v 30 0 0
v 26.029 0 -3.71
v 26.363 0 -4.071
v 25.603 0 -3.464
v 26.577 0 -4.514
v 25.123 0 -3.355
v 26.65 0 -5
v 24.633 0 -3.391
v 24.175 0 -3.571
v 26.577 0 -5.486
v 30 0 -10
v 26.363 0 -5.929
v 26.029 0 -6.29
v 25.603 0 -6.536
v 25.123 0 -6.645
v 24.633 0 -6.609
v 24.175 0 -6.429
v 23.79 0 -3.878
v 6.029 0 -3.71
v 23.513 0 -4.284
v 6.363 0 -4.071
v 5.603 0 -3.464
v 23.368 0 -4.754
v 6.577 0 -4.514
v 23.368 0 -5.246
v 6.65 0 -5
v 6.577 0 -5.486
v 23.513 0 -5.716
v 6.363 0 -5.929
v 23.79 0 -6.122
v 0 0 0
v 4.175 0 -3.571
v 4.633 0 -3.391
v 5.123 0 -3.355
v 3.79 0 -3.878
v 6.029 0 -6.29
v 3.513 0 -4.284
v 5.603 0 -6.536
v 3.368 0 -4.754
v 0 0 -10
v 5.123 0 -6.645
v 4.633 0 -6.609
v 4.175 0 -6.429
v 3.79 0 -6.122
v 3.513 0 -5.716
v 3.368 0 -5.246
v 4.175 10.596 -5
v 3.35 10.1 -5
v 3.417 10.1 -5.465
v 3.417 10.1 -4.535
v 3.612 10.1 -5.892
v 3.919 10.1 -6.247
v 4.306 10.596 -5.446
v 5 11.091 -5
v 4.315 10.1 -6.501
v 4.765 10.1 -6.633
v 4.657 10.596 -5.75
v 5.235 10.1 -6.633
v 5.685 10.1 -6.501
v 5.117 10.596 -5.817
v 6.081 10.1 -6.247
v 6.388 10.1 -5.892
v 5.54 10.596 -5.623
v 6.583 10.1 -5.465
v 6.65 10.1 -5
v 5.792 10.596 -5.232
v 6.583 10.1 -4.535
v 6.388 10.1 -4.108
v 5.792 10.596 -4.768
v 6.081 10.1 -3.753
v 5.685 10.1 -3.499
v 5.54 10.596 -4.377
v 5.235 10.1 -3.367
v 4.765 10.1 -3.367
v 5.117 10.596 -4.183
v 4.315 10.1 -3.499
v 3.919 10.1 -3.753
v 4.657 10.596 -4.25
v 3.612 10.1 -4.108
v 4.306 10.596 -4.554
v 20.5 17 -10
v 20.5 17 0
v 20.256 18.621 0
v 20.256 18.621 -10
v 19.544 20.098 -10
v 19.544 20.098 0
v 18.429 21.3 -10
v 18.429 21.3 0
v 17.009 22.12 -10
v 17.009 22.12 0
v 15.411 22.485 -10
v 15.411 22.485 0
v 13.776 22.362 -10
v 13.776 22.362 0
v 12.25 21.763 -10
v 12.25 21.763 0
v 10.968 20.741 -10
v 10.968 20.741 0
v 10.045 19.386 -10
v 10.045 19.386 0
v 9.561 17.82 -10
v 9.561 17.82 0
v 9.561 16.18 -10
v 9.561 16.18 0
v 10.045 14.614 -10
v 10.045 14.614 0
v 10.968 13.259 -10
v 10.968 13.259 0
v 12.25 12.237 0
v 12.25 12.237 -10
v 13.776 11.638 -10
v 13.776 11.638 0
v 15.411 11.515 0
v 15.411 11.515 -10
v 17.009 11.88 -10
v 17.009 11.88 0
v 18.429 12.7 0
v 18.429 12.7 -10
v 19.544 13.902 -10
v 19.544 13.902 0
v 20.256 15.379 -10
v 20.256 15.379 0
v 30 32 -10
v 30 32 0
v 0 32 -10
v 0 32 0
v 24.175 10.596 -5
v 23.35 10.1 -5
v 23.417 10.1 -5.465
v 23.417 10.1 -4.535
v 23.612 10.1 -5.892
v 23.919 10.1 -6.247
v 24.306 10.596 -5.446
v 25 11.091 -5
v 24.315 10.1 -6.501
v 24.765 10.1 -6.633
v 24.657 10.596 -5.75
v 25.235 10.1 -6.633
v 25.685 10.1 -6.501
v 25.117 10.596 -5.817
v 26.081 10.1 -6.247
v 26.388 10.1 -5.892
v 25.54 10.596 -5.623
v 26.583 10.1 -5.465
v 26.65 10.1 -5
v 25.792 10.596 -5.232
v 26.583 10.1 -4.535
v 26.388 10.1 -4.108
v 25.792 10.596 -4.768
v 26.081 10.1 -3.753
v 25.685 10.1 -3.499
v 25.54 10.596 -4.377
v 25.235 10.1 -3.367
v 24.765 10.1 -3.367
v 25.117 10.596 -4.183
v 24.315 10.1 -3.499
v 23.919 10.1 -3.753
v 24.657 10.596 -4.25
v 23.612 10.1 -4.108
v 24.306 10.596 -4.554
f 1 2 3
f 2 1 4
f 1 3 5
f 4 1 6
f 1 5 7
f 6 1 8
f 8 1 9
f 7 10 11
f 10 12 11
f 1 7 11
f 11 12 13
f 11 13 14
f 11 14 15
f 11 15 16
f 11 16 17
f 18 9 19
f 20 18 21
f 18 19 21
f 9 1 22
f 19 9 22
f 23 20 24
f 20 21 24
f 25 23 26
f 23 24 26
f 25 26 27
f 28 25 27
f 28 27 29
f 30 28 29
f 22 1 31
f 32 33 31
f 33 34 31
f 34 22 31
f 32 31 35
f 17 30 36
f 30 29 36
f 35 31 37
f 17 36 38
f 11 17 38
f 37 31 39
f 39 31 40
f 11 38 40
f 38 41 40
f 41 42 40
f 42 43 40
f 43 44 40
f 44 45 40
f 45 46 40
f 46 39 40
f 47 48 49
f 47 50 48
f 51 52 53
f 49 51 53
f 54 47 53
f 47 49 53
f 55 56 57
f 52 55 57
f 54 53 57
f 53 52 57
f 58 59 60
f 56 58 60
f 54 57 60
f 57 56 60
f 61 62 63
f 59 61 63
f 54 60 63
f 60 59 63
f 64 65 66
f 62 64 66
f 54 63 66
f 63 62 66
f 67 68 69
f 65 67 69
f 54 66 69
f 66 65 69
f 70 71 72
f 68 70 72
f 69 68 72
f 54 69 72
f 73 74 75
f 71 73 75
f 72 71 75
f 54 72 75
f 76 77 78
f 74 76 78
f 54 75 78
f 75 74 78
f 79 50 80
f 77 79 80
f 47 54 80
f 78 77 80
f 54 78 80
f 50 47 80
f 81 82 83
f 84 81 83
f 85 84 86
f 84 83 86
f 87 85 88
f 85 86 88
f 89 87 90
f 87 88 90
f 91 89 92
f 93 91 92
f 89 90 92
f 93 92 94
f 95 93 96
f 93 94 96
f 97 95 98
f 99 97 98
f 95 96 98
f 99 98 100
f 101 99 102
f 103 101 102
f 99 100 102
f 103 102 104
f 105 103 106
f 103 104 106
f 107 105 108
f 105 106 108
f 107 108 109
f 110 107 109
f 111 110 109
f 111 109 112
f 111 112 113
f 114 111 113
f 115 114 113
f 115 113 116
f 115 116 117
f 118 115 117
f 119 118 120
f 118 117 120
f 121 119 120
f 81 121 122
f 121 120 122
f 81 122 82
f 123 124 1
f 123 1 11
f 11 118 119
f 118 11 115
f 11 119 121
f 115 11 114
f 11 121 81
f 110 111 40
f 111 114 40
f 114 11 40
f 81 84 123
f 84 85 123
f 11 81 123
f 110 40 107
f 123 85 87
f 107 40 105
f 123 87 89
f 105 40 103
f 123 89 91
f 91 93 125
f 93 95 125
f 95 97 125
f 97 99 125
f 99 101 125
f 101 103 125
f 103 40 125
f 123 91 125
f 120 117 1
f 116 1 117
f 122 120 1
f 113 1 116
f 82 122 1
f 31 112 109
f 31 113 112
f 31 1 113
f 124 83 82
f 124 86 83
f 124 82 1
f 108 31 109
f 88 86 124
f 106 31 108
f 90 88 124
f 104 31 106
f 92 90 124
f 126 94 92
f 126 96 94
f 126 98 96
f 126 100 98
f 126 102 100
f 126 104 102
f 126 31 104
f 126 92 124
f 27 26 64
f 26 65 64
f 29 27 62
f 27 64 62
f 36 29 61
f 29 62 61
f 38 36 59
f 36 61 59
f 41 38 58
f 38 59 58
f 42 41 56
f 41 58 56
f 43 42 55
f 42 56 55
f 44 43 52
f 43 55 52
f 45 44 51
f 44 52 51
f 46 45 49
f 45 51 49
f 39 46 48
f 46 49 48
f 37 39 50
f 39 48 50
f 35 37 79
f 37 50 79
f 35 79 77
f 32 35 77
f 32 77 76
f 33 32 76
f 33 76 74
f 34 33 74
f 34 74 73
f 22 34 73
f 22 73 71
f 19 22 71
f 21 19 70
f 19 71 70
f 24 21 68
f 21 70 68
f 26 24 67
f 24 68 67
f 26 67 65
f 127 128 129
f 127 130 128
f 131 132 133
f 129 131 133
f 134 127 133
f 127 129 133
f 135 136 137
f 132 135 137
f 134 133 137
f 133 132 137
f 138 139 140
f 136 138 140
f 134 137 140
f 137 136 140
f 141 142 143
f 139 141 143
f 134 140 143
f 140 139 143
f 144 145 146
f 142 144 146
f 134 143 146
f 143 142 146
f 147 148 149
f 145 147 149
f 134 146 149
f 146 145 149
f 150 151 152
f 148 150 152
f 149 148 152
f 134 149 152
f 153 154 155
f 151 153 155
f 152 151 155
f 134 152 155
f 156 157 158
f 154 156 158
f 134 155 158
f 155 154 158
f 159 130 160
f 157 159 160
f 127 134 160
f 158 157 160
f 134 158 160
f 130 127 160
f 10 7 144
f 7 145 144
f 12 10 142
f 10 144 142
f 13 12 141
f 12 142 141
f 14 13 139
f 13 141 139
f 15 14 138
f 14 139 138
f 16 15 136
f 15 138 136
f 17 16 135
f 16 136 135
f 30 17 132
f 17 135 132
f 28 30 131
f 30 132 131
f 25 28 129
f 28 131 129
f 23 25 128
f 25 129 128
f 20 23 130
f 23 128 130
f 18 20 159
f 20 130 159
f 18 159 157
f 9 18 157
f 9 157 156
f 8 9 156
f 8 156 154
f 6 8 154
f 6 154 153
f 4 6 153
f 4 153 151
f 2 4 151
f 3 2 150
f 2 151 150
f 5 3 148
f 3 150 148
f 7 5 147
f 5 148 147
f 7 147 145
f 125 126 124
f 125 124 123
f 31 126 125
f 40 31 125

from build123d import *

# Parameters (mm, degrees)
SKETCH1_W             = 10
SKETCH1_H             = 32
BOSS_EXTRUDE1_DEPTH   = 30
M4_TAPPED_HOLE1_D     = 3.3
M4_TAPPED_HOLE1_DEPTH = 10.1
M4_TAPPED_HOLE1_TIP   = 0.991420021
SKETCH4_R             = 5.5
CUT_EXTRUDE2_DEPTH    = 10


with BuildPart() as part:
    # Sketch1 → Boss-Extrude1 (new body)
    with BuildSketch(Plane(origin=(0, 0, 0), x_dir=(0, 0, -1), z_dir=(1, 0, 0))):
        with Locations((5, 16)):
            Rectangle(SKETCH1_W, SKETCH1_H)
    extrude(amount=BOSS_EXTRUDE1_DEPTH)

    # M4 Tapped Hole1
    with Locations(Plane(origin=(0, 0, 0), x_dir=(-1, 0, 0), z_dir=(0, -1, 0))):
        with Locations((-5, 5), (-25, 5)):
            Hole(M4_TAPPED_HOLE1_D / 2, depth=M4_TAPPED_HOLE1_DEPTH)
            with Locations((0, 0, -(M4_TAPPED_HOLE1_DEPTH + M4_TAPPED_HOLE1_TIP / 2))):  # 118° drill point
                Cone(0, M4_TAPPED_HOLE1_D / 2, M4_TAPPED_HOLE1_TIP, mode=Mode.SUBTRACT)

    # Sketch4 → Cut-Extrude2 (cut)
    with BuildSketch(Plane.XY):
        with Locations((15, 17)):
            Circle(SKETCH4_R)
    extrude(amount=-CUT_EXTRUDE2_DEPTH, mode=Mode.SUBTRACT)


solid = part.part
